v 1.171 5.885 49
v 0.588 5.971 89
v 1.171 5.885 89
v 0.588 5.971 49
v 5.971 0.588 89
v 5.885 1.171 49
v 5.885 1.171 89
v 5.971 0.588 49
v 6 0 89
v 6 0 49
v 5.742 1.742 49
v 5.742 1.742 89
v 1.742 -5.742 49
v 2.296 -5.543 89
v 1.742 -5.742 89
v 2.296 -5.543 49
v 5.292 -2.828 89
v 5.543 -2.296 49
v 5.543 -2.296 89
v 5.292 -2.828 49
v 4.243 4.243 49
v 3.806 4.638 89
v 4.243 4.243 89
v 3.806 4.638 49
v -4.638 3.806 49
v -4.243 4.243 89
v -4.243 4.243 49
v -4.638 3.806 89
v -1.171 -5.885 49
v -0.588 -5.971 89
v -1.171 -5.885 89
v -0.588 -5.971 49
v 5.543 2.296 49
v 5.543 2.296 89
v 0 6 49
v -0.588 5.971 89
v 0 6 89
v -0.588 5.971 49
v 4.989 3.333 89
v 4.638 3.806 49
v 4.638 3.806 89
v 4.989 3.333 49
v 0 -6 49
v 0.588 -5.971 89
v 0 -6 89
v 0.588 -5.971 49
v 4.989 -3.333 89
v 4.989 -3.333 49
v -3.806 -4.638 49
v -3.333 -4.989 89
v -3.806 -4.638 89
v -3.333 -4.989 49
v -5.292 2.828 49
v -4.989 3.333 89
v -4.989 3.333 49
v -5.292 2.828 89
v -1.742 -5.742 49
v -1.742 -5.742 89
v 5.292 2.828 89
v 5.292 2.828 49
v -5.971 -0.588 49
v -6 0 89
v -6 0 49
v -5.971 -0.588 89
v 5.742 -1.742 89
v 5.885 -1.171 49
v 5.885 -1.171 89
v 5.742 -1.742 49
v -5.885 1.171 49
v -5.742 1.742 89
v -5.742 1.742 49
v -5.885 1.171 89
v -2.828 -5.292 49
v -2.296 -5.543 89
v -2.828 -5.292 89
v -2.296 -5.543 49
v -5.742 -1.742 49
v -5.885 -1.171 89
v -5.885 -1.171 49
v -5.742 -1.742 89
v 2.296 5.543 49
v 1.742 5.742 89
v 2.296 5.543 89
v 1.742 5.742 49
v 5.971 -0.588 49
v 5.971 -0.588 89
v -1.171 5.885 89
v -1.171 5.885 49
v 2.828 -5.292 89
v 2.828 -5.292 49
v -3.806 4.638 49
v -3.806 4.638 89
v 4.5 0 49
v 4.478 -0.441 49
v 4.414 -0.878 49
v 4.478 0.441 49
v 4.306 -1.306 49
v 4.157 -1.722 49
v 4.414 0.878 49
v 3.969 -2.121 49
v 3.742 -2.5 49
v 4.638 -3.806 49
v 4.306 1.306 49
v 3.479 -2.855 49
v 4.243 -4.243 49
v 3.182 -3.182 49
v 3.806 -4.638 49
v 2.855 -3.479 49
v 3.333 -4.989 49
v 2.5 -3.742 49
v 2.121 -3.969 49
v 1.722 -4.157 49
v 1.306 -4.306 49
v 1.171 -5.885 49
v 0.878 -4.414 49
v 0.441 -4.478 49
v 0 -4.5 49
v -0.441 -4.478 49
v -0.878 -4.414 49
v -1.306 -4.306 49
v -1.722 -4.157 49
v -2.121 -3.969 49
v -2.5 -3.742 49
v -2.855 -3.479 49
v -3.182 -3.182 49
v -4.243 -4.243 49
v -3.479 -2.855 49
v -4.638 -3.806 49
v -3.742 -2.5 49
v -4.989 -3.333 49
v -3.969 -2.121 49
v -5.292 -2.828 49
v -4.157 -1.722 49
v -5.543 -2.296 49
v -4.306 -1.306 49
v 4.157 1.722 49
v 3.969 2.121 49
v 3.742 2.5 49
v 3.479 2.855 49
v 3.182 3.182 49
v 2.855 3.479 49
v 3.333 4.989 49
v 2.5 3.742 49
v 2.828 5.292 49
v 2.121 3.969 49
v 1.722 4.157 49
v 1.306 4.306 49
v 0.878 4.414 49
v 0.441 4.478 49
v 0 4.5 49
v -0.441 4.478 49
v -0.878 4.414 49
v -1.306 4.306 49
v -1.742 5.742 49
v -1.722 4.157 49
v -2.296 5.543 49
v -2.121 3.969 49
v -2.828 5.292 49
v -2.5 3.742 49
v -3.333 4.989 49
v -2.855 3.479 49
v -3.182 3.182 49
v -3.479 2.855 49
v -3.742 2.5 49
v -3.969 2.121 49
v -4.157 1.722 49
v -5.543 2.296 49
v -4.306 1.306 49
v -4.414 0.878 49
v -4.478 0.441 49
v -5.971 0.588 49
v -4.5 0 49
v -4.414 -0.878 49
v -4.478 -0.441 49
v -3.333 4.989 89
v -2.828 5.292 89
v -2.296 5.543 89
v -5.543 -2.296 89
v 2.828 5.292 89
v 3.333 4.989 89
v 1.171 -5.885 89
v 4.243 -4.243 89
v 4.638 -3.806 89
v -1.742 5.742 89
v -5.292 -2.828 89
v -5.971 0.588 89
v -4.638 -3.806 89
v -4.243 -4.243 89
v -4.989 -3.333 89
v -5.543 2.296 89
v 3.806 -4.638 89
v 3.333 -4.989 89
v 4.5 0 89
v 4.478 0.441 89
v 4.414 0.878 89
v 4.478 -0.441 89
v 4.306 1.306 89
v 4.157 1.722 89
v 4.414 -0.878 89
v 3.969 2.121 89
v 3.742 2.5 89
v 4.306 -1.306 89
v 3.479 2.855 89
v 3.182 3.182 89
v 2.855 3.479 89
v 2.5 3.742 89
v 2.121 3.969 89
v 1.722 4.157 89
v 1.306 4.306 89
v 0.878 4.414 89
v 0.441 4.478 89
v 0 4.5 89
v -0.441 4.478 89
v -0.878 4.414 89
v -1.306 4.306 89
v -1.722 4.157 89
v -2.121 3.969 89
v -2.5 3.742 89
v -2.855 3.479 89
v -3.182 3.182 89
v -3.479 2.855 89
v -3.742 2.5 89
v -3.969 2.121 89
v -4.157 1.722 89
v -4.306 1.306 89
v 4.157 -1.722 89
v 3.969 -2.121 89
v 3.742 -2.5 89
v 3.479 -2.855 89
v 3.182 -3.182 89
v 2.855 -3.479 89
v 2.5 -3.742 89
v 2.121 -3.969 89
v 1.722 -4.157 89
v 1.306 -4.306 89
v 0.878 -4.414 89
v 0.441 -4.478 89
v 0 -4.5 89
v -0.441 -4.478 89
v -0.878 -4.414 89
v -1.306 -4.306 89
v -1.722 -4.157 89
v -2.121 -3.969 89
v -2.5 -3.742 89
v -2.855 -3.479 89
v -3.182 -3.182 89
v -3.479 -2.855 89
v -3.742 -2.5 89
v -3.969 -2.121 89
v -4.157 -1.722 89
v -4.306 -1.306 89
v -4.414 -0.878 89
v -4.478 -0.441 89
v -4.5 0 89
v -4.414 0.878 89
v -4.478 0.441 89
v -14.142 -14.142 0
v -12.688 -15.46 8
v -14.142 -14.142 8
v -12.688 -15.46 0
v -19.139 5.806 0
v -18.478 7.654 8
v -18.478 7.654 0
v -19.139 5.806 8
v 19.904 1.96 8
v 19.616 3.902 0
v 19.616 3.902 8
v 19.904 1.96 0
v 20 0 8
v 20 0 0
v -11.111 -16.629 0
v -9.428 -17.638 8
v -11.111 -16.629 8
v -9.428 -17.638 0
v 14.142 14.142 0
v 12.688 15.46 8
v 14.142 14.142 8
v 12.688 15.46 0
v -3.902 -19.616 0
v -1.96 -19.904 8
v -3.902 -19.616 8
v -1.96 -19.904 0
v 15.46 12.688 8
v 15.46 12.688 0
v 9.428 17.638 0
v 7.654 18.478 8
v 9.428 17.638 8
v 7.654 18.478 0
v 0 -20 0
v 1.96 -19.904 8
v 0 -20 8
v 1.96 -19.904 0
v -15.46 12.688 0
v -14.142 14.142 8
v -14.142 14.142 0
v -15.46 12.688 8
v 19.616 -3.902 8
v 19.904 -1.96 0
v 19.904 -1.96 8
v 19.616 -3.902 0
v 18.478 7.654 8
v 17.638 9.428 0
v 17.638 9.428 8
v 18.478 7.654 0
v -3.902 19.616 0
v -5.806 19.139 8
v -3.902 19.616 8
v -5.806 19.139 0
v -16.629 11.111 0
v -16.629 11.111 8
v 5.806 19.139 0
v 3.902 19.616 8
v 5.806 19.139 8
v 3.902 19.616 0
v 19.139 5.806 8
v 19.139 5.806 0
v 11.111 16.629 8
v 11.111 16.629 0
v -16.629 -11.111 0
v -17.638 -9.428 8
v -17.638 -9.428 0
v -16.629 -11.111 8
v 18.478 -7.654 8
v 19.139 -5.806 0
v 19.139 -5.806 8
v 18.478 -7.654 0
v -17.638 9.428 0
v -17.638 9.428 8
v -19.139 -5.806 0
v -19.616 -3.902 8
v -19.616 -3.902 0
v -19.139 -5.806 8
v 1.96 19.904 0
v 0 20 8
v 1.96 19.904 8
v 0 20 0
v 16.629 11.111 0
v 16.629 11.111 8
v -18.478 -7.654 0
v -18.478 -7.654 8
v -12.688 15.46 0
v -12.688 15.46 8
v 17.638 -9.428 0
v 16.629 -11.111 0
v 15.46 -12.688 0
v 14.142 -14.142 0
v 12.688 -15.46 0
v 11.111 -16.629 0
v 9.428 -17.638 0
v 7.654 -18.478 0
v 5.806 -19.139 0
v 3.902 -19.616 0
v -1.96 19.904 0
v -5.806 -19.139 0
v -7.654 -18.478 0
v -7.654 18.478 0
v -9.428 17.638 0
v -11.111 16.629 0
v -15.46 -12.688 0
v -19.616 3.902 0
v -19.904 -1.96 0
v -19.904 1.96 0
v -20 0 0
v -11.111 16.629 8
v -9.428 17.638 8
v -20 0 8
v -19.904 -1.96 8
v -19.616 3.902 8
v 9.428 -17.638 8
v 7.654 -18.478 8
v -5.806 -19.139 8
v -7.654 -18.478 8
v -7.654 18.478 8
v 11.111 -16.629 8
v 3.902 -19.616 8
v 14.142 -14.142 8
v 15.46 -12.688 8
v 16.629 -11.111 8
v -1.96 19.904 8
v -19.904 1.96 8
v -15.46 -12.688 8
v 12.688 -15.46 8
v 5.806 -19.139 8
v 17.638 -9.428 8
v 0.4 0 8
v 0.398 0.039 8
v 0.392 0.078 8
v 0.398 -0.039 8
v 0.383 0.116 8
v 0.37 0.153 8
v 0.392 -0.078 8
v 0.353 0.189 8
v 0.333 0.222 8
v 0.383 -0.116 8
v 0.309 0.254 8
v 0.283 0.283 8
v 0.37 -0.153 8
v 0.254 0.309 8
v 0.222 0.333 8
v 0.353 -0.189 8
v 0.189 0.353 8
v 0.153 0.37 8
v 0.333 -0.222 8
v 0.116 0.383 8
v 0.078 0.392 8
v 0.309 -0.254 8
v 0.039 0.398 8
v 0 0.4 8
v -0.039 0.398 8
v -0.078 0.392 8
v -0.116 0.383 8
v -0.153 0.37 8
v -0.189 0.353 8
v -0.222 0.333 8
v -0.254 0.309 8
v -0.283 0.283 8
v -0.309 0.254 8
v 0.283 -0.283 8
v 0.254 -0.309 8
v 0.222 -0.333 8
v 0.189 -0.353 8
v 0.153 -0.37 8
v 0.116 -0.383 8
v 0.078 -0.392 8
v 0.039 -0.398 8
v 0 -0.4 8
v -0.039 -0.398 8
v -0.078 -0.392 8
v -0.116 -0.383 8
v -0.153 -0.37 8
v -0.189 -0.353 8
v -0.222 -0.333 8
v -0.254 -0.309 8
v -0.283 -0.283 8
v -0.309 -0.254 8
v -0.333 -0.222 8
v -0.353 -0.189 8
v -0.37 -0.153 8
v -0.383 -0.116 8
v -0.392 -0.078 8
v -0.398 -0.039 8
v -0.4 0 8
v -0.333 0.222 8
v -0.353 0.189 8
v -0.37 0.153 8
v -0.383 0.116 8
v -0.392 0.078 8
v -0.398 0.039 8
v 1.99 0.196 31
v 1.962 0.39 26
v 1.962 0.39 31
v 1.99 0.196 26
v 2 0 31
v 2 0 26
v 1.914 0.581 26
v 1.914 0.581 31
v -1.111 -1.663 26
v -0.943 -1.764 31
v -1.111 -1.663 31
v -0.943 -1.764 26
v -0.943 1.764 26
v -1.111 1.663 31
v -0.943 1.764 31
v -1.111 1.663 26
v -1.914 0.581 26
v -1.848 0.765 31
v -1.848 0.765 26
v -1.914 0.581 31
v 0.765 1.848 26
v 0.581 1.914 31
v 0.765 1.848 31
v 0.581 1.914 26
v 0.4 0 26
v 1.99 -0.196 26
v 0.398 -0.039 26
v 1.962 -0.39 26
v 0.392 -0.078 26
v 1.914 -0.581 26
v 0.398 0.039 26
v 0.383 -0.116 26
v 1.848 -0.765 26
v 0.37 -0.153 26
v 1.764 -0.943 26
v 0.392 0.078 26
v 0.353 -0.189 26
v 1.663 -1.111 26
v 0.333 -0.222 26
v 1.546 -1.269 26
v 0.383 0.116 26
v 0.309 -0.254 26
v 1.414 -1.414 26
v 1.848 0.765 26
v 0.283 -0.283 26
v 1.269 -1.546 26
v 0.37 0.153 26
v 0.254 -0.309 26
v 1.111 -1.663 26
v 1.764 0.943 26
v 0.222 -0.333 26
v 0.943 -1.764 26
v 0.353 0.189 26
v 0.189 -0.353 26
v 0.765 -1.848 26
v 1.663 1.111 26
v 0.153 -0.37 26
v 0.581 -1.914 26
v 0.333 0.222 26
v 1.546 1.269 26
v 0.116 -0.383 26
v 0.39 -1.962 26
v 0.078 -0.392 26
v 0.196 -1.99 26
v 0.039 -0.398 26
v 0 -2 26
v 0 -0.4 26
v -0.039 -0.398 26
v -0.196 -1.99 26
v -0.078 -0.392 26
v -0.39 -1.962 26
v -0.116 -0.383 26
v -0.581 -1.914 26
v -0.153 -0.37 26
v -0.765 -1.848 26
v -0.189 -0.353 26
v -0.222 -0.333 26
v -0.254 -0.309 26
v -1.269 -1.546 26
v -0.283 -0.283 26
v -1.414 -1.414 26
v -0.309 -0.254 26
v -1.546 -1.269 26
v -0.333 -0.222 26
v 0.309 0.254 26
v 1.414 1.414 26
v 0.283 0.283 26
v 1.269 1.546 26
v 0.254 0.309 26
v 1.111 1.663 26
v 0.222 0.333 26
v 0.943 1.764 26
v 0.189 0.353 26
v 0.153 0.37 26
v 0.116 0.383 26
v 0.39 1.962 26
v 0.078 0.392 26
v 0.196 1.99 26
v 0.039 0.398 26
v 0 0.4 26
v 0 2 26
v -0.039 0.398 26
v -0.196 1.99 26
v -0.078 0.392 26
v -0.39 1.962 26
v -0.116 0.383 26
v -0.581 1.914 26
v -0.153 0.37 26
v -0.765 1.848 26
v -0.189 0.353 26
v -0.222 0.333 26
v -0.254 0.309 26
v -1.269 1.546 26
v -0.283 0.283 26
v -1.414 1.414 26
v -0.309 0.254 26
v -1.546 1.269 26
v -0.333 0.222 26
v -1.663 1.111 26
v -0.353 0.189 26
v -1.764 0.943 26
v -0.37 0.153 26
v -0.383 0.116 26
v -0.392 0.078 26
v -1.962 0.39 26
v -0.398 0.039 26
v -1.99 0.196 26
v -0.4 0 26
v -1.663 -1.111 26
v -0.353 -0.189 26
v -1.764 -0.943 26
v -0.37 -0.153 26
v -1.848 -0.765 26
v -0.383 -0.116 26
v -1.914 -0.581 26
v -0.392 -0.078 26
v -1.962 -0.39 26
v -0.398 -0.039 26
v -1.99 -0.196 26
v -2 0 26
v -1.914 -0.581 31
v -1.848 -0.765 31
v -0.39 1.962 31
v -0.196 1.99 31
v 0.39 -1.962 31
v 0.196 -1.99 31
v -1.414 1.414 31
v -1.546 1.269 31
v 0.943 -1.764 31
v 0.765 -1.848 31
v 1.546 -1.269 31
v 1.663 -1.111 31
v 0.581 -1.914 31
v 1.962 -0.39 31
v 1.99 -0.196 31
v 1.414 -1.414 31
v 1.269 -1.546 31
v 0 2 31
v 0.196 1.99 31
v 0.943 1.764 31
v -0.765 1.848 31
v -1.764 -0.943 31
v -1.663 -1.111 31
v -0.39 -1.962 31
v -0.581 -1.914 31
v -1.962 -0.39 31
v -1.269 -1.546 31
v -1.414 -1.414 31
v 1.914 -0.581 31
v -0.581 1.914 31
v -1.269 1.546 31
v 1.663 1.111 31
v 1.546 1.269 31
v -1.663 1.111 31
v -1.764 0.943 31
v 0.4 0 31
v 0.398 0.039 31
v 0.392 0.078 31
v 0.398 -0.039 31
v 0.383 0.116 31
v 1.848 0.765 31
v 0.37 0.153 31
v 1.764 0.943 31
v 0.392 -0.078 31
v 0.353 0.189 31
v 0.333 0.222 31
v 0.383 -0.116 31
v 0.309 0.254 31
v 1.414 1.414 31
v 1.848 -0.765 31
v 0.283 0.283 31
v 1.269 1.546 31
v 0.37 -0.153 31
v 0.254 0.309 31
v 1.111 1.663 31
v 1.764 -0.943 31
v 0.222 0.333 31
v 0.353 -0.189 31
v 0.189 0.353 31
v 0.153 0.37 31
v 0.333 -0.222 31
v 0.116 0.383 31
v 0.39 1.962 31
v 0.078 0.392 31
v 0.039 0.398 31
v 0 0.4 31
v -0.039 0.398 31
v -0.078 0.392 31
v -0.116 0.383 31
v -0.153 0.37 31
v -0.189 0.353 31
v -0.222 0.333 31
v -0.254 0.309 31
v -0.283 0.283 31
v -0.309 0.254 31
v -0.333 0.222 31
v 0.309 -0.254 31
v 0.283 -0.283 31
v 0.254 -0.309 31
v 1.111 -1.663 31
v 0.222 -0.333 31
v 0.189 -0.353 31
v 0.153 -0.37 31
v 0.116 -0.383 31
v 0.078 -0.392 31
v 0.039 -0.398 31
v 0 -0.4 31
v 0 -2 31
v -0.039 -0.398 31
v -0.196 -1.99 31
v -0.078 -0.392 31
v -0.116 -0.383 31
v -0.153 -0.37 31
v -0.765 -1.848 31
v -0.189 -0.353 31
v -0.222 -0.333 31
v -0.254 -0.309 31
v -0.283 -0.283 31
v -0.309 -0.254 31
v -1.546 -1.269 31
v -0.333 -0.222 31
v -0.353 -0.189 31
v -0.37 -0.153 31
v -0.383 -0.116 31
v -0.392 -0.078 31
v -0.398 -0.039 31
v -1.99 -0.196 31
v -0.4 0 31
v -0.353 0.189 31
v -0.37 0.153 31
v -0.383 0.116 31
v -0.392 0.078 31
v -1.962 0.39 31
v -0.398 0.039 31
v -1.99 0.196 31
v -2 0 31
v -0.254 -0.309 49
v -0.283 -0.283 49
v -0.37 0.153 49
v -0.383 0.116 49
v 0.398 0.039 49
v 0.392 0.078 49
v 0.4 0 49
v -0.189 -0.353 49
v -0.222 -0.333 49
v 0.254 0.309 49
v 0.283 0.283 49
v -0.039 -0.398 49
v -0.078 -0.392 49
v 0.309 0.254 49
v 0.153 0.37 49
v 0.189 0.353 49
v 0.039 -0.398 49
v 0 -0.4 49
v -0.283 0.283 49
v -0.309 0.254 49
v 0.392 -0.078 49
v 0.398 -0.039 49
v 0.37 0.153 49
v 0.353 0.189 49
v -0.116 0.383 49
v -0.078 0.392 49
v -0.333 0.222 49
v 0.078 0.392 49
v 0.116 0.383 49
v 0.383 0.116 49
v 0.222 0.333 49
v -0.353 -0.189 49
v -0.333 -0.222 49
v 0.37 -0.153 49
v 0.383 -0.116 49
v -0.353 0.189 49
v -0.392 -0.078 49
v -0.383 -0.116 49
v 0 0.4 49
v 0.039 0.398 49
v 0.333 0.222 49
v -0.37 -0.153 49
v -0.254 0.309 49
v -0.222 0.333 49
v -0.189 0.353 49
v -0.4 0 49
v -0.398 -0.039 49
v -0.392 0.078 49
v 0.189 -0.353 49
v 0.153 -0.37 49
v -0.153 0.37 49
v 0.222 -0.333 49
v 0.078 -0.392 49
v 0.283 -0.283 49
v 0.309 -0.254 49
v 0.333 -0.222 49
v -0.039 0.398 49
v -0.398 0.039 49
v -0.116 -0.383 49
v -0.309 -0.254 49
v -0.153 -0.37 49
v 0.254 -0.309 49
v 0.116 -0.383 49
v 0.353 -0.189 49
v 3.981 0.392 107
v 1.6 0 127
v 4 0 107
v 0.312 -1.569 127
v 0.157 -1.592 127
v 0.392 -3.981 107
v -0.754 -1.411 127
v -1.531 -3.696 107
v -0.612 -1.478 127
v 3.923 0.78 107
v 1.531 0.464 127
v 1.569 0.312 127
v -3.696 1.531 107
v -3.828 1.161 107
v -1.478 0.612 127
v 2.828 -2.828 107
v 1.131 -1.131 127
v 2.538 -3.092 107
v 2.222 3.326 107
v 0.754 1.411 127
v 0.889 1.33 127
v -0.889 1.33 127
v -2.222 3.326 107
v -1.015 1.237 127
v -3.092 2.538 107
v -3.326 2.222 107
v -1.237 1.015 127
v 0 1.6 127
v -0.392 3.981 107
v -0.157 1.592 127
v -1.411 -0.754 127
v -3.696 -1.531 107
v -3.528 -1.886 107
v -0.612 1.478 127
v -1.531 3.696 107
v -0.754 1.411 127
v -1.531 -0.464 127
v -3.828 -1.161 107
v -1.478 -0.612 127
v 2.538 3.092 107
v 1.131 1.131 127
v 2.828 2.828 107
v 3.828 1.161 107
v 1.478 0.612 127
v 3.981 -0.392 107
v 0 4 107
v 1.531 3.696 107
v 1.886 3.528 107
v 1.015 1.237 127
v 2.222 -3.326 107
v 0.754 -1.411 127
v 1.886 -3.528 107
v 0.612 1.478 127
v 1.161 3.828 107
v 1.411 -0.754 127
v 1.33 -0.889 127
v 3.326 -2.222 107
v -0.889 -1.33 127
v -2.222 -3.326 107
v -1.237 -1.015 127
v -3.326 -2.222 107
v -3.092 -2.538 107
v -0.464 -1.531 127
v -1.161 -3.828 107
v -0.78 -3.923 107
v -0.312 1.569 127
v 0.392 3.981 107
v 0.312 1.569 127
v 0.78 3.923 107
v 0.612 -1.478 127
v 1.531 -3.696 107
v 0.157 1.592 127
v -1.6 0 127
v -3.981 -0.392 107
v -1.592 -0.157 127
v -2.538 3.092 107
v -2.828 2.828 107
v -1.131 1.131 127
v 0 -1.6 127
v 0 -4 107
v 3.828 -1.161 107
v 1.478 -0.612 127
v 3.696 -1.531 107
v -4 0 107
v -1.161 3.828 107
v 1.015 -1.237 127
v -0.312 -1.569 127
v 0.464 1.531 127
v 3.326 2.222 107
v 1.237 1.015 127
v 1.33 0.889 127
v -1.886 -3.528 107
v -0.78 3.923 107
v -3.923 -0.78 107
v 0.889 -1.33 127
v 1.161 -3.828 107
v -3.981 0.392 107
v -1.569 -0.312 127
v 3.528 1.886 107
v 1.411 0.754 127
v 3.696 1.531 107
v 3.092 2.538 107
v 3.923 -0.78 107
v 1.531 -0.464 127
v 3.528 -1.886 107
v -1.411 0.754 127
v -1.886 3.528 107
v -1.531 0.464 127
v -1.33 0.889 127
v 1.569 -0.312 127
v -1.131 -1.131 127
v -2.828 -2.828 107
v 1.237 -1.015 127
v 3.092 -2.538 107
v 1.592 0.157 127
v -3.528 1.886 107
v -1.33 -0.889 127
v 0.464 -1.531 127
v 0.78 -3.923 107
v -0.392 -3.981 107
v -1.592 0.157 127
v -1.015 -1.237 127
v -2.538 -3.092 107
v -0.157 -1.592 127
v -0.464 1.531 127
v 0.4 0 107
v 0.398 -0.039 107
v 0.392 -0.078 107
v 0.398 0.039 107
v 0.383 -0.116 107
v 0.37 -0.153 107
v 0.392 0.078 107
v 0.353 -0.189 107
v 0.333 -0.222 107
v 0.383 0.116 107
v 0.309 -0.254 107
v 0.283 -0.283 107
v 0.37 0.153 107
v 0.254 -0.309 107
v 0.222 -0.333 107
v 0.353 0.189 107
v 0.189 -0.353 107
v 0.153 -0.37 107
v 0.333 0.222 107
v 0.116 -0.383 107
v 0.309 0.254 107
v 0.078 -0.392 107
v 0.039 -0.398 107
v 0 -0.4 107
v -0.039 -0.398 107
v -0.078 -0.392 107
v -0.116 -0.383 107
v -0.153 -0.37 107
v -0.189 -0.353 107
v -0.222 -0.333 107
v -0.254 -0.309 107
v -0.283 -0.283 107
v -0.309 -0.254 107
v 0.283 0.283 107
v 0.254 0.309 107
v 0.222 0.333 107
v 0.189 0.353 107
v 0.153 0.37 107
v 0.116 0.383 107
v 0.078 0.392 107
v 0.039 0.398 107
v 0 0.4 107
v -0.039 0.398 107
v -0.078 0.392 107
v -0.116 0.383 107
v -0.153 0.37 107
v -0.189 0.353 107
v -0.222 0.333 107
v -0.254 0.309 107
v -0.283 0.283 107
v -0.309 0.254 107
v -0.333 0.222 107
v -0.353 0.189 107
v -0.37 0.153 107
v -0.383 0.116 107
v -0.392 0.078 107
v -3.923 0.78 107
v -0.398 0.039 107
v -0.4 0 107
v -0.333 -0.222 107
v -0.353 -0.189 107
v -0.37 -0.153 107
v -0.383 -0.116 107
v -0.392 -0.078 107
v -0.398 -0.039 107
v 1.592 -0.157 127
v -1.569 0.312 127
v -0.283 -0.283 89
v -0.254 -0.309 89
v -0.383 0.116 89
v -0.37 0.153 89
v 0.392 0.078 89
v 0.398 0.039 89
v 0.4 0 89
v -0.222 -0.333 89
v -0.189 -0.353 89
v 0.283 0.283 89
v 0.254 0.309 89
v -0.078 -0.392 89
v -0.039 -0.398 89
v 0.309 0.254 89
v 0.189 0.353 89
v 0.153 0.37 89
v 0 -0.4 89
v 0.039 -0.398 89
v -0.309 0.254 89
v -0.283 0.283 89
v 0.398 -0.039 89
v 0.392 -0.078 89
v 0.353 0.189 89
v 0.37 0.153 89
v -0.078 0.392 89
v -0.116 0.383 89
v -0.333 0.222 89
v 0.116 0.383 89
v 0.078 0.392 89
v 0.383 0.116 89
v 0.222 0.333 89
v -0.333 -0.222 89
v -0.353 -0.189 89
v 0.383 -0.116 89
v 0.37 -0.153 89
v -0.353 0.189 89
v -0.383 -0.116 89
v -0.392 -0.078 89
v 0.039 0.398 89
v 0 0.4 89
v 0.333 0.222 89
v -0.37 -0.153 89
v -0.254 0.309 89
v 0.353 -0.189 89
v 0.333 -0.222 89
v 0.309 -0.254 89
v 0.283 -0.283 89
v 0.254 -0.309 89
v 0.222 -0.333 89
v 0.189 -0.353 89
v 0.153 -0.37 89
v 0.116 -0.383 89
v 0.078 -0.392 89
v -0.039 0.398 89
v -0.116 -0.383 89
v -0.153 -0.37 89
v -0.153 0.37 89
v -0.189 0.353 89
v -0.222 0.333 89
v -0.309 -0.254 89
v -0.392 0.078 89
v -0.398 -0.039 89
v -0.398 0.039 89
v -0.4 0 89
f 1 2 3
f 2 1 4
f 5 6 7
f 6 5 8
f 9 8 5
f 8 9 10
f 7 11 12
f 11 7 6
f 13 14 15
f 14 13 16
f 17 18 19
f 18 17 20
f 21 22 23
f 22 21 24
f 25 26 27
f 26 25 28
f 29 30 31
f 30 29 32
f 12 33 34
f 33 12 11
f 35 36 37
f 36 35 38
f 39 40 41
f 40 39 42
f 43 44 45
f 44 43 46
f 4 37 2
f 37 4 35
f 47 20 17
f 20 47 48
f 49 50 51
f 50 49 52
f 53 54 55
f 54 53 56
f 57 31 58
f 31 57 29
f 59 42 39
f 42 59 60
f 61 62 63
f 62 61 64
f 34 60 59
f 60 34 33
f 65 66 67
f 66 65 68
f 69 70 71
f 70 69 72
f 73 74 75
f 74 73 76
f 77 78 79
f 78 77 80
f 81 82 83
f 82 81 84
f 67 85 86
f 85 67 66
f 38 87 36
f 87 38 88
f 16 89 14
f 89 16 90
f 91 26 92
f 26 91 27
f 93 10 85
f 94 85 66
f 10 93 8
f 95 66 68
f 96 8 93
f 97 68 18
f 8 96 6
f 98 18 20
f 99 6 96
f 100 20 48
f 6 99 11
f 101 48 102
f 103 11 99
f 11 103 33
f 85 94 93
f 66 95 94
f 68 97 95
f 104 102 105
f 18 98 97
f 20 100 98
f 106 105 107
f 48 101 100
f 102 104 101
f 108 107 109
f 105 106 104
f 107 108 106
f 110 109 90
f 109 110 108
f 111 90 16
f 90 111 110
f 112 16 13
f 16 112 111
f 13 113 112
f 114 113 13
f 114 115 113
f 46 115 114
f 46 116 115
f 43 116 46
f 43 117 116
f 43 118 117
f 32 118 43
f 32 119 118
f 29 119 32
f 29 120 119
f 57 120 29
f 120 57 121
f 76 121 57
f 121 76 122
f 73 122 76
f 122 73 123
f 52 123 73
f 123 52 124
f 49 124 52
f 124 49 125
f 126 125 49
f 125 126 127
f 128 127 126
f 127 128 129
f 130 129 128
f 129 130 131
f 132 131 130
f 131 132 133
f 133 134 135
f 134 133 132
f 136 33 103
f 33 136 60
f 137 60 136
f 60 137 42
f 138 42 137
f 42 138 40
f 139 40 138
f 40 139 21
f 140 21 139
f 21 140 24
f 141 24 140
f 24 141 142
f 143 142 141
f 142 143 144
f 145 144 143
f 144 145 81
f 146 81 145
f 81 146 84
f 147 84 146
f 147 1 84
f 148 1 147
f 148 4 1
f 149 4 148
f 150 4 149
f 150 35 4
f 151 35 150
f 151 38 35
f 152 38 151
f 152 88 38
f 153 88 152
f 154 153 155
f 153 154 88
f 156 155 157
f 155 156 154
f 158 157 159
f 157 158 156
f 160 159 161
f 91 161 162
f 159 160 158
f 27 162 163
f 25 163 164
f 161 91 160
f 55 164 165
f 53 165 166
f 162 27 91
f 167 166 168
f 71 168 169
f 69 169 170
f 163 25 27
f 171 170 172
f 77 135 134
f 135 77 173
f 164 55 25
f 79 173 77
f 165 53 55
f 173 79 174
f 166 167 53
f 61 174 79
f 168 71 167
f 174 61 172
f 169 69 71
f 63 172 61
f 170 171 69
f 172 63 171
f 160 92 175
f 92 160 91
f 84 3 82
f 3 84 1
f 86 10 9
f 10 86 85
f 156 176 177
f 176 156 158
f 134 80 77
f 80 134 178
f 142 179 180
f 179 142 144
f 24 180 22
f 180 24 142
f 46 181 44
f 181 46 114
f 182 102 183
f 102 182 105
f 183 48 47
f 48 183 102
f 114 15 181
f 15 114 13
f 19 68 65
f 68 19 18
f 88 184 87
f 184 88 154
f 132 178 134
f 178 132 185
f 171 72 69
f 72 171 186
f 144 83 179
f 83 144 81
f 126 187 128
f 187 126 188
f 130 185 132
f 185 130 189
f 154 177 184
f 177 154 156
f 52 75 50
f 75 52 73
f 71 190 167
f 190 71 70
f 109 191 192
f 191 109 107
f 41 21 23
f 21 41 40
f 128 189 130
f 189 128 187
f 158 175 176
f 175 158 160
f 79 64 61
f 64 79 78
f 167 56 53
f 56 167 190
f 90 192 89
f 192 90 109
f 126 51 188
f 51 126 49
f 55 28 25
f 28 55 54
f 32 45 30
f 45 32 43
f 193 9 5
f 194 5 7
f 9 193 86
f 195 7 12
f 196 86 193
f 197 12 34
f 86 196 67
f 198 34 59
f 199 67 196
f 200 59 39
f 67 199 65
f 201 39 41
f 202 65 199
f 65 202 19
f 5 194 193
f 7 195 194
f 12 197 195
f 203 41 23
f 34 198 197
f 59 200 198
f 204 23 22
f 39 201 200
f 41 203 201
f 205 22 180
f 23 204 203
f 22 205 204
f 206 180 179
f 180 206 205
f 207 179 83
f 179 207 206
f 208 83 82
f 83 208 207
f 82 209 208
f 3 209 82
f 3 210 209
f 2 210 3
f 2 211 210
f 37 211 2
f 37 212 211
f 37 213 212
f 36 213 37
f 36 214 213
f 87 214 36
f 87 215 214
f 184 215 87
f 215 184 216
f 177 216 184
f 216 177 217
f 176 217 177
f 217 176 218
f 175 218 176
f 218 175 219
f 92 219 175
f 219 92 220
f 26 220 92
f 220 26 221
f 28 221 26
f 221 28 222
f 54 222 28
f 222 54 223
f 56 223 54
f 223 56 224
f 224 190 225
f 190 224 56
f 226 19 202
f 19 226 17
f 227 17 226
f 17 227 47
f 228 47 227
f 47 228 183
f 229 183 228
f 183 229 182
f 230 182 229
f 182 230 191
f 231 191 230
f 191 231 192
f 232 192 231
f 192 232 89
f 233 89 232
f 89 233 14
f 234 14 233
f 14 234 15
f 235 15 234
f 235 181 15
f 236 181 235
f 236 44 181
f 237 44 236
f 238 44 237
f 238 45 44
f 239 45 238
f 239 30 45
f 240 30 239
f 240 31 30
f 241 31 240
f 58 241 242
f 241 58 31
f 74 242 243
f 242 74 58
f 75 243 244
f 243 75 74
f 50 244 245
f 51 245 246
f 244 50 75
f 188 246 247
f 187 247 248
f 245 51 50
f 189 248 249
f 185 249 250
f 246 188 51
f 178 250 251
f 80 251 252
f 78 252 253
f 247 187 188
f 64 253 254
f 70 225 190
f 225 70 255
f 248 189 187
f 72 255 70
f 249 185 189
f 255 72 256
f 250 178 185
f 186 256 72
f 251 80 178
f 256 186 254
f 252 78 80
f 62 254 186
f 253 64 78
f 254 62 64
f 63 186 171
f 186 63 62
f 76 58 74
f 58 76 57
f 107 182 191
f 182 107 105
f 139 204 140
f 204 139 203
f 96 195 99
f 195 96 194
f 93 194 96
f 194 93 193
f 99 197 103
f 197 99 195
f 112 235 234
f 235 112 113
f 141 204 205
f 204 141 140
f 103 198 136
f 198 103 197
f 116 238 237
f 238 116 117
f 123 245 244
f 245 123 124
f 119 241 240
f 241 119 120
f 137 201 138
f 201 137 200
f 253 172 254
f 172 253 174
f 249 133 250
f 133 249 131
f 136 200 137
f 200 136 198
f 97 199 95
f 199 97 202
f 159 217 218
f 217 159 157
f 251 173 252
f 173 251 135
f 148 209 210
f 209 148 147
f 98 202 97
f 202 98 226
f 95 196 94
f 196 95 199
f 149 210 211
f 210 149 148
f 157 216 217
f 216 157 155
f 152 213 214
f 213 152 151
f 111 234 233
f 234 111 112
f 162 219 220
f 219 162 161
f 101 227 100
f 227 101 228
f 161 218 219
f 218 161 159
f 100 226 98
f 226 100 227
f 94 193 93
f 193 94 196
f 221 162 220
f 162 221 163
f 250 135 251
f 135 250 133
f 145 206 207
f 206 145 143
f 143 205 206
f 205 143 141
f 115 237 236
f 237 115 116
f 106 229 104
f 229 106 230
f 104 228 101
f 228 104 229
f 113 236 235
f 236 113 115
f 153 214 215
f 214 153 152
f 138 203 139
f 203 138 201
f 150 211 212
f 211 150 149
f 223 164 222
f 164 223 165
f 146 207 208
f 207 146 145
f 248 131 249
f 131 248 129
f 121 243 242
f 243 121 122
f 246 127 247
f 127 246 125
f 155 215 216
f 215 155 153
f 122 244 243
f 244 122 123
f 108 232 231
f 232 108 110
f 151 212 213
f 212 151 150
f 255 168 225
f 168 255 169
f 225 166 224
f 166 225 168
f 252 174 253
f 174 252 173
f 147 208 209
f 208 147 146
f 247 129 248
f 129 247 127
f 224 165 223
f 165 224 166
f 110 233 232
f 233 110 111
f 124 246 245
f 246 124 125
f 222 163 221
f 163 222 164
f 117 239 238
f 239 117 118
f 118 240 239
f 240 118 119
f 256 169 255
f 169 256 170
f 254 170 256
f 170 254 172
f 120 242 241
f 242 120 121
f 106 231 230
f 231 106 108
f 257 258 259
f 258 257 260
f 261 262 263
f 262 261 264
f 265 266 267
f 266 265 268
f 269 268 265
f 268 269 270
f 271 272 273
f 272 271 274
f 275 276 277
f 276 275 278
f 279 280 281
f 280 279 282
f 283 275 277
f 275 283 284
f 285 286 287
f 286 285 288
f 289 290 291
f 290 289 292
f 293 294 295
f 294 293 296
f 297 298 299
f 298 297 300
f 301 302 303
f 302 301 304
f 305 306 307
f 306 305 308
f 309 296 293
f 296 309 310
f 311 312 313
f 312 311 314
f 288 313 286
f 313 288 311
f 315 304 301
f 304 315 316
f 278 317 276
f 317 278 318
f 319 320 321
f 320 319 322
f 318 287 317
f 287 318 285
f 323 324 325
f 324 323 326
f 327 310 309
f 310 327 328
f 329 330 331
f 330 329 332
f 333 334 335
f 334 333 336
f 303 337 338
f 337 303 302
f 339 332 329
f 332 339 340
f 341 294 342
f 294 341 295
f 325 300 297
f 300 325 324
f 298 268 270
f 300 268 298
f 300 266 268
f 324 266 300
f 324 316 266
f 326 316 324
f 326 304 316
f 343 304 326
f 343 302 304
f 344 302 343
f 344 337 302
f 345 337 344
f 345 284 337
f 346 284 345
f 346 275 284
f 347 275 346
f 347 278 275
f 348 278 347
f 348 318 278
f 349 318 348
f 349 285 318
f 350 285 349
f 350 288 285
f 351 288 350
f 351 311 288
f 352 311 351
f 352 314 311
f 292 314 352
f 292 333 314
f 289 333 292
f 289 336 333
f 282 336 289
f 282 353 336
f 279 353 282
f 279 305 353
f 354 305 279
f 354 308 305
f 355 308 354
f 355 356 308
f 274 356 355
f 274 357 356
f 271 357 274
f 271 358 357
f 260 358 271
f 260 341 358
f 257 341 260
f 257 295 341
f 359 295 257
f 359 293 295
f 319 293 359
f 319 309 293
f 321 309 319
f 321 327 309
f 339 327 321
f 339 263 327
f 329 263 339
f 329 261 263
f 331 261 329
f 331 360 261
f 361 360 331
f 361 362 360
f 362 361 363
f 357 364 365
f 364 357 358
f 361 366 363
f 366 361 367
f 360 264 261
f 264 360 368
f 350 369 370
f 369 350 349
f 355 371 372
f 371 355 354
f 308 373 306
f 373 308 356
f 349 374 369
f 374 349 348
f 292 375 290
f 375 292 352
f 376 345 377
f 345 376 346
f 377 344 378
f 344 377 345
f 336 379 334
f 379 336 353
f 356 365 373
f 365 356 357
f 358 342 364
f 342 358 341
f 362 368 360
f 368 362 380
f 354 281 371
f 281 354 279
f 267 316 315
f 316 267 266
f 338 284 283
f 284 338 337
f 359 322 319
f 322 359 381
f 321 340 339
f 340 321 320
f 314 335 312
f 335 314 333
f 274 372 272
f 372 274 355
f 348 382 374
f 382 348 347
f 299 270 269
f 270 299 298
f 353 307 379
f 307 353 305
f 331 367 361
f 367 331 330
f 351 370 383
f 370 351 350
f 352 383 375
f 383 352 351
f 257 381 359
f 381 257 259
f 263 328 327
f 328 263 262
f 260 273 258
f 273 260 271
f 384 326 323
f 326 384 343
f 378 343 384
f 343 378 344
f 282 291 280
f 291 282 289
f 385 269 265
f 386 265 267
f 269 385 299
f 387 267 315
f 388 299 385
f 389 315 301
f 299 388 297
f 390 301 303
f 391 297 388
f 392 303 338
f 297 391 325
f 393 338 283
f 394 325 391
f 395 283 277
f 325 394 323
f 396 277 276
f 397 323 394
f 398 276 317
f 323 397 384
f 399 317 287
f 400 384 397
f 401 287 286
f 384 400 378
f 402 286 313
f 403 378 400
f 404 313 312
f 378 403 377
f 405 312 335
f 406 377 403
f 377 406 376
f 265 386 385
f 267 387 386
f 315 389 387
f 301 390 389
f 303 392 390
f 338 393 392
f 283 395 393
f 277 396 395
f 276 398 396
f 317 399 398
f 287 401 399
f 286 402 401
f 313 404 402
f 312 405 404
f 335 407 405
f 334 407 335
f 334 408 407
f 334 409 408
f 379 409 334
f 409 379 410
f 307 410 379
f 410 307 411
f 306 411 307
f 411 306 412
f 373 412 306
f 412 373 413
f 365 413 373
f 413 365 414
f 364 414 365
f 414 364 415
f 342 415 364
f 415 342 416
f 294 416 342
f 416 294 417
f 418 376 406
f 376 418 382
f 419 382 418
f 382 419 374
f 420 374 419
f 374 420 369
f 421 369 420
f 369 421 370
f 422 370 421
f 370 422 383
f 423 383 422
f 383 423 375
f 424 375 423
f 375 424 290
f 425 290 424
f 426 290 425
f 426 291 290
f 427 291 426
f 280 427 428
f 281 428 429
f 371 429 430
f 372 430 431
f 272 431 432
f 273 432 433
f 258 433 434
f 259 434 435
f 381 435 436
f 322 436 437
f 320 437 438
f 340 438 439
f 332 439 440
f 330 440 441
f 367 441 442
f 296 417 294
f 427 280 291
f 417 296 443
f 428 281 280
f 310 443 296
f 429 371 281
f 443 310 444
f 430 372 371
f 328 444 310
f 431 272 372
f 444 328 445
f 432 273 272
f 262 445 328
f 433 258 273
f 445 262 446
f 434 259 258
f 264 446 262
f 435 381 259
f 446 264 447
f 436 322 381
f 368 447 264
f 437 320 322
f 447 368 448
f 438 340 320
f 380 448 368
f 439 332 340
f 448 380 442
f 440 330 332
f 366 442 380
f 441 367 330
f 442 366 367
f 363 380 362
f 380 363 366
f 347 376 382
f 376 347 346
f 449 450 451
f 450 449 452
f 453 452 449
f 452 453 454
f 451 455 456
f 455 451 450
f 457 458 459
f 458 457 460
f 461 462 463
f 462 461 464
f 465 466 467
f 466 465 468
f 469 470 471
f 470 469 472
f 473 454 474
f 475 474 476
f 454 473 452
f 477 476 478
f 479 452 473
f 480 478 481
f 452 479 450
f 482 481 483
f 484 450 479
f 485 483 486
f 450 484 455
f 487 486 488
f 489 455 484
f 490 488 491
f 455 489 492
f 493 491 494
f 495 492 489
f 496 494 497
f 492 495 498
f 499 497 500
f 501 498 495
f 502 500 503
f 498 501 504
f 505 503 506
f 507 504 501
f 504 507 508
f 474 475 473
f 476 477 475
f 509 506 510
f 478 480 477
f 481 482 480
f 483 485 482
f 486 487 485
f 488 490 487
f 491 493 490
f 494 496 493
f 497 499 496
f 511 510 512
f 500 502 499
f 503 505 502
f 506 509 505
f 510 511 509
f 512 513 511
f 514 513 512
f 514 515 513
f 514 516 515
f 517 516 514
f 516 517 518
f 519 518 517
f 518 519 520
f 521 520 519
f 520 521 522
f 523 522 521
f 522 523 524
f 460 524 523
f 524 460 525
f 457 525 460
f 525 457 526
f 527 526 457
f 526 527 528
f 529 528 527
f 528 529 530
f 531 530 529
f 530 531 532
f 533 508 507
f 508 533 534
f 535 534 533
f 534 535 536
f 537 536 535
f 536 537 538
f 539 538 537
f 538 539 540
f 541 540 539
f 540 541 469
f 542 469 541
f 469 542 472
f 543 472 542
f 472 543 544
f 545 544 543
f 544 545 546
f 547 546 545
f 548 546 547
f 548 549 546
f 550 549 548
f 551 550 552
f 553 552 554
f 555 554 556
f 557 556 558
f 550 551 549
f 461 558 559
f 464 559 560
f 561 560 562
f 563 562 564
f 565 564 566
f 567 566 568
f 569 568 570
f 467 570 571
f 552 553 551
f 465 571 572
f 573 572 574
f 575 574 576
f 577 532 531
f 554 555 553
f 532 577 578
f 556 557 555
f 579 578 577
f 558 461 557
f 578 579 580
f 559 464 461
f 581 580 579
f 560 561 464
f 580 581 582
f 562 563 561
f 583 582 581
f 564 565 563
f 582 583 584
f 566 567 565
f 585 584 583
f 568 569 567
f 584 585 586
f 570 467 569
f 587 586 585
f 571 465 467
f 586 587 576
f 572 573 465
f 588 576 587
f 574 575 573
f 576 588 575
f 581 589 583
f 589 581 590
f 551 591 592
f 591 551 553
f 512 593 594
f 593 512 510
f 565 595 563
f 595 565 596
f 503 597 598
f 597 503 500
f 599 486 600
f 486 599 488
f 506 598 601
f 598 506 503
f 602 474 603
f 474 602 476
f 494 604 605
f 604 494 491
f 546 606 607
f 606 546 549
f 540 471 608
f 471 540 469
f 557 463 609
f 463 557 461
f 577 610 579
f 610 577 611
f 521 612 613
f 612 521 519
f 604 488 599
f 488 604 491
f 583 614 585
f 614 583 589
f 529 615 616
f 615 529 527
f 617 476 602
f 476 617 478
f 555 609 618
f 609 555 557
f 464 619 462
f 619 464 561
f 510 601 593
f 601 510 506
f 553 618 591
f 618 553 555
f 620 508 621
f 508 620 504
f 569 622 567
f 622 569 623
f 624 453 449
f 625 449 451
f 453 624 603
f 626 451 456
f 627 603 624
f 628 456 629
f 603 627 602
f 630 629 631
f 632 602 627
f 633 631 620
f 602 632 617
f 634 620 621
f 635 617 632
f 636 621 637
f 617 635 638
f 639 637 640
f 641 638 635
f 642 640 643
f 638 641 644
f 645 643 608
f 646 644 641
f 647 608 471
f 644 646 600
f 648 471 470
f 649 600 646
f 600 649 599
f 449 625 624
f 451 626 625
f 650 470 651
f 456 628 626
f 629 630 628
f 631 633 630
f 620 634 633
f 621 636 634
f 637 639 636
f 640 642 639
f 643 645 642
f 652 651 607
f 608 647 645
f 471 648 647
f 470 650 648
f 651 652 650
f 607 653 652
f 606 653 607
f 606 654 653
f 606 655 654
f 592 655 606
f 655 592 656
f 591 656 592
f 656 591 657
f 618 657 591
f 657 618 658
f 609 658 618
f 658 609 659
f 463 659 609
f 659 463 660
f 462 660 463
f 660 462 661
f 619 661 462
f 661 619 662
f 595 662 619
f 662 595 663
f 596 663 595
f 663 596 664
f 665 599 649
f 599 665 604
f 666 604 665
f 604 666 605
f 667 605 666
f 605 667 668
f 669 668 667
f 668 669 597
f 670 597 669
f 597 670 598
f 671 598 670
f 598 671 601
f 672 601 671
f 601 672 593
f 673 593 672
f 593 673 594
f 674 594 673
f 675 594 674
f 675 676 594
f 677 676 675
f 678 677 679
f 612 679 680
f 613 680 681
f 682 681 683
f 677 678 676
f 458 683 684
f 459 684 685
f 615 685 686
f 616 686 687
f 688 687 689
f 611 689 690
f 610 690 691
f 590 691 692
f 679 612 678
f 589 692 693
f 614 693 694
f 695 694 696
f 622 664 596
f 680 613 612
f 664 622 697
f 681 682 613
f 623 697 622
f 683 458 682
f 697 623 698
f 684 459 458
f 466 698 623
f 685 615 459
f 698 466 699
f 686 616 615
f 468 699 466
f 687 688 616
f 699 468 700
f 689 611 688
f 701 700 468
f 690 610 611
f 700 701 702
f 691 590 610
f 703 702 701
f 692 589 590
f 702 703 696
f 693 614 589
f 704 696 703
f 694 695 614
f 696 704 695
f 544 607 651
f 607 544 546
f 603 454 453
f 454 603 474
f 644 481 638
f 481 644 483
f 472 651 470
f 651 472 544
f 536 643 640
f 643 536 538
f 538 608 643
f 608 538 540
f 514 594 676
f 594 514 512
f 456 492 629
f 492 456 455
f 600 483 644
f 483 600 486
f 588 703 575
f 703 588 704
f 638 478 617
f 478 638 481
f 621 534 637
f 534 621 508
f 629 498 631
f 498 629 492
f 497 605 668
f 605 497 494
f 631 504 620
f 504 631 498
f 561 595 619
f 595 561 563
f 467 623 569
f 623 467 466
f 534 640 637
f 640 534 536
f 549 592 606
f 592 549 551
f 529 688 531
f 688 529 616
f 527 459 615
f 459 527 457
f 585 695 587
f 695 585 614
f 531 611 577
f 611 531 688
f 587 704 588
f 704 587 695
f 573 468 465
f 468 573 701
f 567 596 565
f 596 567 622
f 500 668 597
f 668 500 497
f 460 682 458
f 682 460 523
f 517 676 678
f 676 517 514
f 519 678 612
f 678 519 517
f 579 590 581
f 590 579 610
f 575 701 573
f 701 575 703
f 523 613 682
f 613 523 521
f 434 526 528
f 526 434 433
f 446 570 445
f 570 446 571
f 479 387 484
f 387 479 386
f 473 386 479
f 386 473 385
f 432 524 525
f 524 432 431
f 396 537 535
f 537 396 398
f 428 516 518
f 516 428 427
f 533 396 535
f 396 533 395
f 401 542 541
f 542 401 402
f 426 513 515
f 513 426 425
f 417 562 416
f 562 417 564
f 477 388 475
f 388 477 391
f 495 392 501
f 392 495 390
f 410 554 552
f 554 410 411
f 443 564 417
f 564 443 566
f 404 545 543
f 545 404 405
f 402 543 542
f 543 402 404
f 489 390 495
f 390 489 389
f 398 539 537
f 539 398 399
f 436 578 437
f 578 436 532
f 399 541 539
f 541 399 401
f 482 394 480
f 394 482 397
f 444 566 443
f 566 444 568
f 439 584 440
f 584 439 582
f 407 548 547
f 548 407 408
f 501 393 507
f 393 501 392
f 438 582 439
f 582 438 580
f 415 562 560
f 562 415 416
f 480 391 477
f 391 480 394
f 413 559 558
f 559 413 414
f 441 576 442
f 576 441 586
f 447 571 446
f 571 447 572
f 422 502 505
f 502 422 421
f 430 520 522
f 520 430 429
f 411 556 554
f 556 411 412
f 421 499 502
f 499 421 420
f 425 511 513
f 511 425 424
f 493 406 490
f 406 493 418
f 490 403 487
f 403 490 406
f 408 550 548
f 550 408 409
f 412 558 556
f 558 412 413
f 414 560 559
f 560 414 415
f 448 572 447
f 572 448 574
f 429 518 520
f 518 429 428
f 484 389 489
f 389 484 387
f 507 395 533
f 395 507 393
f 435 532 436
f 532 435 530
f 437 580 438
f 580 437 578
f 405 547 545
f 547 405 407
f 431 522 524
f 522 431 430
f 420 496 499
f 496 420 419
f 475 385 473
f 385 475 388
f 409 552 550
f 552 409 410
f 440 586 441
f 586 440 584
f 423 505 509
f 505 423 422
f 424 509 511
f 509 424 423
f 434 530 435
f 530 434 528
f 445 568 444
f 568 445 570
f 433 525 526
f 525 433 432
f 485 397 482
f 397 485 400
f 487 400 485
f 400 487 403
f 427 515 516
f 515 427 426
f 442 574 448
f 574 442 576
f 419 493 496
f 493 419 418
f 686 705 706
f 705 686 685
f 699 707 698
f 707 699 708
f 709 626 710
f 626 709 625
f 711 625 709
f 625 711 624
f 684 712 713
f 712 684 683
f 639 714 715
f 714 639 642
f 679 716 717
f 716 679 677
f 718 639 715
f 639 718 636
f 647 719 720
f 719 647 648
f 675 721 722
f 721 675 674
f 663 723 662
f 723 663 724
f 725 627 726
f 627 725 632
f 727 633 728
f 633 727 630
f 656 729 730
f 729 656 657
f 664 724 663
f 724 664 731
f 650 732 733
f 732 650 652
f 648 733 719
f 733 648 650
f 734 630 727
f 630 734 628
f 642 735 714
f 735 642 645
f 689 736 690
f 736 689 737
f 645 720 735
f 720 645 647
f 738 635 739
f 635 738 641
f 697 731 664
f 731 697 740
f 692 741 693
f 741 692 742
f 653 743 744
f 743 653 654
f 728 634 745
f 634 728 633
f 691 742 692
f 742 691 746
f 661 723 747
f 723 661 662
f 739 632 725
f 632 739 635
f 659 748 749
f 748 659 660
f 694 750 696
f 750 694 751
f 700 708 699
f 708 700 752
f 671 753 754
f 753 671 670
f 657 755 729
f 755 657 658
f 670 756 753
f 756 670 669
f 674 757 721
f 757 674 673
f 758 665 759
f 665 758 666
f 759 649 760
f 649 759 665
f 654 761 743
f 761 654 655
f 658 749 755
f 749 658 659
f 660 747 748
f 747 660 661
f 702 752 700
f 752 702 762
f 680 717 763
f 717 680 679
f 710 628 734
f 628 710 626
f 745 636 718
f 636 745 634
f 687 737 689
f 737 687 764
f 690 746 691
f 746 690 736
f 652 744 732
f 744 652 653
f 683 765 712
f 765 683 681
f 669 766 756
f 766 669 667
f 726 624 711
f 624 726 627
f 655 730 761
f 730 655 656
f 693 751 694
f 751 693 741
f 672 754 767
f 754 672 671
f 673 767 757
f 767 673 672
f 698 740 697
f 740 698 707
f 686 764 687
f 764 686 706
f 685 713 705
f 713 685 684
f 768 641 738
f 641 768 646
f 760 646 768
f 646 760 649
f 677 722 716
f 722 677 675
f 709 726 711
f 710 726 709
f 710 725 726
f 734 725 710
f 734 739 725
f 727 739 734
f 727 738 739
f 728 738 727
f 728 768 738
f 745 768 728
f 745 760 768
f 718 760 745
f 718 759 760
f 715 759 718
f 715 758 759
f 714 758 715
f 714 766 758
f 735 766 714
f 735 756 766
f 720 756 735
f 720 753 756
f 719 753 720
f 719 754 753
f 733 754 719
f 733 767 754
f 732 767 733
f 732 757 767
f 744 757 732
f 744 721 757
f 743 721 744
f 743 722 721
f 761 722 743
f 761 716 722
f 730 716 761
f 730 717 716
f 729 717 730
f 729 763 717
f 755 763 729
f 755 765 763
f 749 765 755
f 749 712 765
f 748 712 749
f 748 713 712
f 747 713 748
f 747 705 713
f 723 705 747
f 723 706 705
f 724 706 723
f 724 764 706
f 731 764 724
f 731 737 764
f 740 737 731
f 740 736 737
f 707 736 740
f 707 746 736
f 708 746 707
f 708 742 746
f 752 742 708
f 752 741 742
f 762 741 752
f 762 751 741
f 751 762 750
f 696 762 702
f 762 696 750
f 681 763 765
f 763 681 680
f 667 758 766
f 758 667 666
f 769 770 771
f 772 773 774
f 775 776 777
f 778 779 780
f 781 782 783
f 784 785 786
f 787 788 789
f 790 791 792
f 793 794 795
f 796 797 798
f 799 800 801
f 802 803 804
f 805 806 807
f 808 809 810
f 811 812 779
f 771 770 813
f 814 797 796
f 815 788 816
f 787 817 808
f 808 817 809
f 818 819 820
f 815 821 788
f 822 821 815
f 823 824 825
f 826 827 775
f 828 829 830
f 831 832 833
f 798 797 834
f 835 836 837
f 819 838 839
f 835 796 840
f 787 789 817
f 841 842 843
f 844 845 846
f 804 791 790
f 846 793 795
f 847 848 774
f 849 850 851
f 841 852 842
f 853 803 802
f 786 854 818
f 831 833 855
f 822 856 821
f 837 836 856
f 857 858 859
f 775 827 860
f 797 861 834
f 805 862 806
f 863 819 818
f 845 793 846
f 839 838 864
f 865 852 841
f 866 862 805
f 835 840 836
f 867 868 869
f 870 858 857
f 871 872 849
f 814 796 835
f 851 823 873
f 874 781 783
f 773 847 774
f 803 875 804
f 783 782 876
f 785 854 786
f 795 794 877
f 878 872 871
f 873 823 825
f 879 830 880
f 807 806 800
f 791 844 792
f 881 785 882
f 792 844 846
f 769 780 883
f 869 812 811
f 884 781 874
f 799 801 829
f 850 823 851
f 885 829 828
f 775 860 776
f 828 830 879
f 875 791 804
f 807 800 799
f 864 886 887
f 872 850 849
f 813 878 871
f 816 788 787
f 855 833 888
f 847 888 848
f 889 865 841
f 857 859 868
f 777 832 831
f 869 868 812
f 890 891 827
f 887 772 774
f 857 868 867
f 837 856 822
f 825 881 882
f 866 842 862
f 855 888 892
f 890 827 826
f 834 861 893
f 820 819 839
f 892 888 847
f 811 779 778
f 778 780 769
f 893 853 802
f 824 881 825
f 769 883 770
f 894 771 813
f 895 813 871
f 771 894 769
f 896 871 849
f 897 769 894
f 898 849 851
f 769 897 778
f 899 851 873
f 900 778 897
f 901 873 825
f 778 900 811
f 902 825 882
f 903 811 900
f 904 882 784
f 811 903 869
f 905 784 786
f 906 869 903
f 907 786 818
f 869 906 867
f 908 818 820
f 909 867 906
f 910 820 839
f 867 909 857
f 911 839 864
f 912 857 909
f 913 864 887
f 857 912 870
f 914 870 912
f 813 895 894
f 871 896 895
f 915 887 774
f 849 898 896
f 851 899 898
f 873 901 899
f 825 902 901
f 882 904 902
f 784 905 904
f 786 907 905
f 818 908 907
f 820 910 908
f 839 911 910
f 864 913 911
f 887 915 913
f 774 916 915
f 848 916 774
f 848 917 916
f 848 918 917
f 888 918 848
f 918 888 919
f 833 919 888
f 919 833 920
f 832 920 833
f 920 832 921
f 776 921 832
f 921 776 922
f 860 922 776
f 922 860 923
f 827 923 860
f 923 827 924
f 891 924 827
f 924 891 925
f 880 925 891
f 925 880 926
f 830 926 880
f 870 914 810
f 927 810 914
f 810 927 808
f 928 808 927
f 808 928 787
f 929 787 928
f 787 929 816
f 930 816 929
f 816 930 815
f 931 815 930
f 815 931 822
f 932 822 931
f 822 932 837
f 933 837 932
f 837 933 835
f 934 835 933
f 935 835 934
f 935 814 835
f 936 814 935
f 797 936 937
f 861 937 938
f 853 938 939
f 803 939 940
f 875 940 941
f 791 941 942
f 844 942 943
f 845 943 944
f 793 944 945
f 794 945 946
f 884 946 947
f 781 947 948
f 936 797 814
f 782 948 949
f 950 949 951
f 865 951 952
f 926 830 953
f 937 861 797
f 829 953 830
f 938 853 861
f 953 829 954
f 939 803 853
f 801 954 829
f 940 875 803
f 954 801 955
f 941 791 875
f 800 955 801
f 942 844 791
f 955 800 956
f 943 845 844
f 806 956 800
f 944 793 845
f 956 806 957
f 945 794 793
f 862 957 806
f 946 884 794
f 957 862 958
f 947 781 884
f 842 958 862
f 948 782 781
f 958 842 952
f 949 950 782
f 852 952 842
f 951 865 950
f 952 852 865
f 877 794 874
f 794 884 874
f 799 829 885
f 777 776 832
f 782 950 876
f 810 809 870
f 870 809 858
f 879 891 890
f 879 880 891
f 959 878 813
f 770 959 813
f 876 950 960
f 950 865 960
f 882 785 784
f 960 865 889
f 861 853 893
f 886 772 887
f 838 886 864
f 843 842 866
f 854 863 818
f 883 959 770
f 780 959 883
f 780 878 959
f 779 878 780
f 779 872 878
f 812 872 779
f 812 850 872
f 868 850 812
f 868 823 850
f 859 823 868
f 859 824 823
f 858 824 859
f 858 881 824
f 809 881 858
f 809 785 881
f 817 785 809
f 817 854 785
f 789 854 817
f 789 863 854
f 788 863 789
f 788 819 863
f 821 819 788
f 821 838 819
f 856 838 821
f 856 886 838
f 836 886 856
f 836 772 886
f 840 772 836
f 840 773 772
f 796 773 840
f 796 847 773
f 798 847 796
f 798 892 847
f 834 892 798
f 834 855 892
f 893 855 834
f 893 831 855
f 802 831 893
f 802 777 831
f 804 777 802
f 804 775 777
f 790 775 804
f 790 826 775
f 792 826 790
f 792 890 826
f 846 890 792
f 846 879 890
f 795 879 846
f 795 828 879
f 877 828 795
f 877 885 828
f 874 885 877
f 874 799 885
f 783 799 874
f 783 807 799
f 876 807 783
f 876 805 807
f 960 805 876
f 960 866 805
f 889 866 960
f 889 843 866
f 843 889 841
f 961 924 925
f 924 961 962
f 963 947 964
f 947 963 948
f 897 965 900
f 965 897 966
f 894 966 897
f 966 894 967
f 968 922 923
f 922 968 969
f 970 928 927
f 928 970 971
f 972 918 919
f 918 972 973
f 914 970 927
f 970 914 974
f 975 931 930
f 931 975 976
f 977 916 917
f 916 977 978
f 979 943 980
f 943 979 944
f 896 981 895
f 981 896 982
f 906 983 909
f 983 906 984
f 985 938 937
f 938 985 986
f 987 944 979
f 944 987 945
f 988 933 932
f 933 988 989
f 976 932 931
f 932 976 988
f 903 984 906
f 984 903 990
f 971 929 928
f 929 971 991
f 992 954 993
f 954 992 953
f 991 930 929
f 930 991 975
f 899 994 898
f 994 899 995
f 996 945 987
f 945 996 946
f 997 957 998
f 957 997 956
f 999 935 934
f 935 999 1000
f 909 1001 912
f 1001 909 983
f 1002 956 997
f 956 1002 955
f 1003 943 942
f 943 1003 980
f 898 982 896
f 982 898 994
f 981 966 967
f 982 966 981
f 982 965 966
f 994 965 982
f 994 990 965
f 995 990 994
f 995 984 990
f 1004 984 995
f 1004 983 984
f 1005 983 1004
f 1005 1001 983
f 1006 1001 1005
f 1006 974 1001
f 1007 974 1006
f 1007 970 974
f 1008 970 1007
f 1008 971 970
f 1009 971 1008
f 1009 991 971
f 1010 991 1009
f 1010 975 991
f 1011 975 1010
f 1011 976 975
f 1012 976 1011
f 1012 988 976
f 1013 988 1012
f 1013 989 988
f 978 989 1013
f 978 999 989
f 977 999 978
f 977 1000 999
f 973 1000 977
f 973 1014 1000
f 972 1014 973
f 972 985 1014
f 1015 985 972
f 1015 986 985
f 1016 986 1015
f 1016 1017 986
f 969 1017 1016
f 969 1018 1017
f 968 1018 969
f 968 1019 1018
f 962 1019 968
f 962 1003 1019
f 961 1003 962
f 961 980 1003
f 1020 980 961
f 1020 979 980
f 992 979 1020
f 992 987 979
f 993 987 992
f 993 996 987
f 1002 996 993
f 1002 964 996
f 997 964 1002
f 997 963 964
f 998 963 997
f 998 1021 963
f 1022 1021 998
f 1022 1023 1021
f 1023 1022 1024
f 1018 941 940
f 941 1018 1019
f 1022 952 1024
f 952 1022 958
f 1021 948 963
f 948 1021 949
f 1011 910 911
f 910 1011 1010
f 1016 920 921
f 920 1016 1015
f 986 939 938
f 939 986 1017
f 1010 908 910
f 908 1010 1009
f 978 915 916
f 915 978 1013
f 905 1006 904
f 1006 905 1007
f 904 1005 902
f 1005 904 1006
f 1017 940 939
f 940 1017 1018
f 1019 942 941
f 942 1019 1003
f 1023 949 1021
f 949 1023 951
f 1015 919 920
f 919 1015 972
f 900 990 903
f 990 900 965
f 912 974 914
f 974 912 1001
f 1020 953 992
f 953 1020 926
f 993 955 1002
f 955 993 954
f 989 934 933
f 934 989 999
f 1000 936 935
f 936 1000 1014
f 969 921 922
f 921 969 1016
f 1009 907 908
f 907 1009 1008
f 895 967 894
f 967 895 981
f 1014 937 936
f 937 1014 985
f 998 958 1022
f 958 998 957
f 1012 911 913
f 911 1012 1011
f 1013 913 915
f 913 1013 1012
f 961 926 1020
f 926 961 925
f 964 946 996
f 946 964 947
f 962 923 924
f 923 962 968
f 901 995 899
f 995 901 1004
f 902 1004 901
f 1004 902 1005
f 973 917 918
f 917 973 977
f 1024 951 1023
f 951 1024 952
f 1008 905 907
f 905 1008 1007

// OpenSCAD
// 사시도 — 분리(Exploded) 뷰
// 각 부품을 Z축 방향으로 떼어내어 내부 구조가 보이도록 표현

$fn = 64;

BASE_COLOR  = [0.85, 0.85, 0.85];
MID_COLOR   = [0.60, 0.80, 1.00];
TOP_COLOR   = [1.00, 0.75, 0.30];

BASE_R  = 20;  BASE_H  = 8;
MID_R   = 6;   MID_H   = 40;
TOP_R   = 4;   TOP_H   = 20;
FEED_R  = 2;   FEED_H  = 5;

// 분리 간격
GAP = 18;

// ① 기저 플레이트 — 원래 위치
color(BASE_COLOR)
    cylinder(r=BASE_R, h=BASE_H);

// ② 동축 피드 핀 — GAP 만큼 위로 분리
color([0.3, 0.3, 0.3])
    translate([0, 0, BASE_H + GAP])
        cylinder(r=FEED_R, h=FEED_H);

// 연결 점선 표현 (얇은 실린더)
color([0.7, 0.7, 0.7])
    translate([0, 0, BASE_H])
        cylinder(r=0.4, h=GAP);

// ③ 중간 슬리브 — 2×GAP 만큼 위로 분리
color(MID_COLOR)
    translate([0, 0, BASE_H + FEED_H + 2*GAP])
        difference() {
            cylinder(r=MID_R,     h=MID_H);
            cylinder(r=MID_R-1.5, h=MID_H);
        }

color([0.7, 0.7, 0.7])
    translate([0, 0, BASE_H + FEED_H + GAP])
        cylinder(r=0.4, h=GAP);

// ④ 상단 방사 소자 — 3×GAP 만큼 위로 분리
color(TOP_COLOR)
    translate([0, 0, BASE_H + FEED_H + MID_H + 3*GAP])
        cylinder(r1=TOP_R, r2=TOP_R*0.4, h=TOP_H);

color([0.7, 0.7, 0.7])
    translate([0, 0, BASE_H + FEED_H + MID_H + 2*GAP])
        cylinder(r=0.4, h=GAP);
